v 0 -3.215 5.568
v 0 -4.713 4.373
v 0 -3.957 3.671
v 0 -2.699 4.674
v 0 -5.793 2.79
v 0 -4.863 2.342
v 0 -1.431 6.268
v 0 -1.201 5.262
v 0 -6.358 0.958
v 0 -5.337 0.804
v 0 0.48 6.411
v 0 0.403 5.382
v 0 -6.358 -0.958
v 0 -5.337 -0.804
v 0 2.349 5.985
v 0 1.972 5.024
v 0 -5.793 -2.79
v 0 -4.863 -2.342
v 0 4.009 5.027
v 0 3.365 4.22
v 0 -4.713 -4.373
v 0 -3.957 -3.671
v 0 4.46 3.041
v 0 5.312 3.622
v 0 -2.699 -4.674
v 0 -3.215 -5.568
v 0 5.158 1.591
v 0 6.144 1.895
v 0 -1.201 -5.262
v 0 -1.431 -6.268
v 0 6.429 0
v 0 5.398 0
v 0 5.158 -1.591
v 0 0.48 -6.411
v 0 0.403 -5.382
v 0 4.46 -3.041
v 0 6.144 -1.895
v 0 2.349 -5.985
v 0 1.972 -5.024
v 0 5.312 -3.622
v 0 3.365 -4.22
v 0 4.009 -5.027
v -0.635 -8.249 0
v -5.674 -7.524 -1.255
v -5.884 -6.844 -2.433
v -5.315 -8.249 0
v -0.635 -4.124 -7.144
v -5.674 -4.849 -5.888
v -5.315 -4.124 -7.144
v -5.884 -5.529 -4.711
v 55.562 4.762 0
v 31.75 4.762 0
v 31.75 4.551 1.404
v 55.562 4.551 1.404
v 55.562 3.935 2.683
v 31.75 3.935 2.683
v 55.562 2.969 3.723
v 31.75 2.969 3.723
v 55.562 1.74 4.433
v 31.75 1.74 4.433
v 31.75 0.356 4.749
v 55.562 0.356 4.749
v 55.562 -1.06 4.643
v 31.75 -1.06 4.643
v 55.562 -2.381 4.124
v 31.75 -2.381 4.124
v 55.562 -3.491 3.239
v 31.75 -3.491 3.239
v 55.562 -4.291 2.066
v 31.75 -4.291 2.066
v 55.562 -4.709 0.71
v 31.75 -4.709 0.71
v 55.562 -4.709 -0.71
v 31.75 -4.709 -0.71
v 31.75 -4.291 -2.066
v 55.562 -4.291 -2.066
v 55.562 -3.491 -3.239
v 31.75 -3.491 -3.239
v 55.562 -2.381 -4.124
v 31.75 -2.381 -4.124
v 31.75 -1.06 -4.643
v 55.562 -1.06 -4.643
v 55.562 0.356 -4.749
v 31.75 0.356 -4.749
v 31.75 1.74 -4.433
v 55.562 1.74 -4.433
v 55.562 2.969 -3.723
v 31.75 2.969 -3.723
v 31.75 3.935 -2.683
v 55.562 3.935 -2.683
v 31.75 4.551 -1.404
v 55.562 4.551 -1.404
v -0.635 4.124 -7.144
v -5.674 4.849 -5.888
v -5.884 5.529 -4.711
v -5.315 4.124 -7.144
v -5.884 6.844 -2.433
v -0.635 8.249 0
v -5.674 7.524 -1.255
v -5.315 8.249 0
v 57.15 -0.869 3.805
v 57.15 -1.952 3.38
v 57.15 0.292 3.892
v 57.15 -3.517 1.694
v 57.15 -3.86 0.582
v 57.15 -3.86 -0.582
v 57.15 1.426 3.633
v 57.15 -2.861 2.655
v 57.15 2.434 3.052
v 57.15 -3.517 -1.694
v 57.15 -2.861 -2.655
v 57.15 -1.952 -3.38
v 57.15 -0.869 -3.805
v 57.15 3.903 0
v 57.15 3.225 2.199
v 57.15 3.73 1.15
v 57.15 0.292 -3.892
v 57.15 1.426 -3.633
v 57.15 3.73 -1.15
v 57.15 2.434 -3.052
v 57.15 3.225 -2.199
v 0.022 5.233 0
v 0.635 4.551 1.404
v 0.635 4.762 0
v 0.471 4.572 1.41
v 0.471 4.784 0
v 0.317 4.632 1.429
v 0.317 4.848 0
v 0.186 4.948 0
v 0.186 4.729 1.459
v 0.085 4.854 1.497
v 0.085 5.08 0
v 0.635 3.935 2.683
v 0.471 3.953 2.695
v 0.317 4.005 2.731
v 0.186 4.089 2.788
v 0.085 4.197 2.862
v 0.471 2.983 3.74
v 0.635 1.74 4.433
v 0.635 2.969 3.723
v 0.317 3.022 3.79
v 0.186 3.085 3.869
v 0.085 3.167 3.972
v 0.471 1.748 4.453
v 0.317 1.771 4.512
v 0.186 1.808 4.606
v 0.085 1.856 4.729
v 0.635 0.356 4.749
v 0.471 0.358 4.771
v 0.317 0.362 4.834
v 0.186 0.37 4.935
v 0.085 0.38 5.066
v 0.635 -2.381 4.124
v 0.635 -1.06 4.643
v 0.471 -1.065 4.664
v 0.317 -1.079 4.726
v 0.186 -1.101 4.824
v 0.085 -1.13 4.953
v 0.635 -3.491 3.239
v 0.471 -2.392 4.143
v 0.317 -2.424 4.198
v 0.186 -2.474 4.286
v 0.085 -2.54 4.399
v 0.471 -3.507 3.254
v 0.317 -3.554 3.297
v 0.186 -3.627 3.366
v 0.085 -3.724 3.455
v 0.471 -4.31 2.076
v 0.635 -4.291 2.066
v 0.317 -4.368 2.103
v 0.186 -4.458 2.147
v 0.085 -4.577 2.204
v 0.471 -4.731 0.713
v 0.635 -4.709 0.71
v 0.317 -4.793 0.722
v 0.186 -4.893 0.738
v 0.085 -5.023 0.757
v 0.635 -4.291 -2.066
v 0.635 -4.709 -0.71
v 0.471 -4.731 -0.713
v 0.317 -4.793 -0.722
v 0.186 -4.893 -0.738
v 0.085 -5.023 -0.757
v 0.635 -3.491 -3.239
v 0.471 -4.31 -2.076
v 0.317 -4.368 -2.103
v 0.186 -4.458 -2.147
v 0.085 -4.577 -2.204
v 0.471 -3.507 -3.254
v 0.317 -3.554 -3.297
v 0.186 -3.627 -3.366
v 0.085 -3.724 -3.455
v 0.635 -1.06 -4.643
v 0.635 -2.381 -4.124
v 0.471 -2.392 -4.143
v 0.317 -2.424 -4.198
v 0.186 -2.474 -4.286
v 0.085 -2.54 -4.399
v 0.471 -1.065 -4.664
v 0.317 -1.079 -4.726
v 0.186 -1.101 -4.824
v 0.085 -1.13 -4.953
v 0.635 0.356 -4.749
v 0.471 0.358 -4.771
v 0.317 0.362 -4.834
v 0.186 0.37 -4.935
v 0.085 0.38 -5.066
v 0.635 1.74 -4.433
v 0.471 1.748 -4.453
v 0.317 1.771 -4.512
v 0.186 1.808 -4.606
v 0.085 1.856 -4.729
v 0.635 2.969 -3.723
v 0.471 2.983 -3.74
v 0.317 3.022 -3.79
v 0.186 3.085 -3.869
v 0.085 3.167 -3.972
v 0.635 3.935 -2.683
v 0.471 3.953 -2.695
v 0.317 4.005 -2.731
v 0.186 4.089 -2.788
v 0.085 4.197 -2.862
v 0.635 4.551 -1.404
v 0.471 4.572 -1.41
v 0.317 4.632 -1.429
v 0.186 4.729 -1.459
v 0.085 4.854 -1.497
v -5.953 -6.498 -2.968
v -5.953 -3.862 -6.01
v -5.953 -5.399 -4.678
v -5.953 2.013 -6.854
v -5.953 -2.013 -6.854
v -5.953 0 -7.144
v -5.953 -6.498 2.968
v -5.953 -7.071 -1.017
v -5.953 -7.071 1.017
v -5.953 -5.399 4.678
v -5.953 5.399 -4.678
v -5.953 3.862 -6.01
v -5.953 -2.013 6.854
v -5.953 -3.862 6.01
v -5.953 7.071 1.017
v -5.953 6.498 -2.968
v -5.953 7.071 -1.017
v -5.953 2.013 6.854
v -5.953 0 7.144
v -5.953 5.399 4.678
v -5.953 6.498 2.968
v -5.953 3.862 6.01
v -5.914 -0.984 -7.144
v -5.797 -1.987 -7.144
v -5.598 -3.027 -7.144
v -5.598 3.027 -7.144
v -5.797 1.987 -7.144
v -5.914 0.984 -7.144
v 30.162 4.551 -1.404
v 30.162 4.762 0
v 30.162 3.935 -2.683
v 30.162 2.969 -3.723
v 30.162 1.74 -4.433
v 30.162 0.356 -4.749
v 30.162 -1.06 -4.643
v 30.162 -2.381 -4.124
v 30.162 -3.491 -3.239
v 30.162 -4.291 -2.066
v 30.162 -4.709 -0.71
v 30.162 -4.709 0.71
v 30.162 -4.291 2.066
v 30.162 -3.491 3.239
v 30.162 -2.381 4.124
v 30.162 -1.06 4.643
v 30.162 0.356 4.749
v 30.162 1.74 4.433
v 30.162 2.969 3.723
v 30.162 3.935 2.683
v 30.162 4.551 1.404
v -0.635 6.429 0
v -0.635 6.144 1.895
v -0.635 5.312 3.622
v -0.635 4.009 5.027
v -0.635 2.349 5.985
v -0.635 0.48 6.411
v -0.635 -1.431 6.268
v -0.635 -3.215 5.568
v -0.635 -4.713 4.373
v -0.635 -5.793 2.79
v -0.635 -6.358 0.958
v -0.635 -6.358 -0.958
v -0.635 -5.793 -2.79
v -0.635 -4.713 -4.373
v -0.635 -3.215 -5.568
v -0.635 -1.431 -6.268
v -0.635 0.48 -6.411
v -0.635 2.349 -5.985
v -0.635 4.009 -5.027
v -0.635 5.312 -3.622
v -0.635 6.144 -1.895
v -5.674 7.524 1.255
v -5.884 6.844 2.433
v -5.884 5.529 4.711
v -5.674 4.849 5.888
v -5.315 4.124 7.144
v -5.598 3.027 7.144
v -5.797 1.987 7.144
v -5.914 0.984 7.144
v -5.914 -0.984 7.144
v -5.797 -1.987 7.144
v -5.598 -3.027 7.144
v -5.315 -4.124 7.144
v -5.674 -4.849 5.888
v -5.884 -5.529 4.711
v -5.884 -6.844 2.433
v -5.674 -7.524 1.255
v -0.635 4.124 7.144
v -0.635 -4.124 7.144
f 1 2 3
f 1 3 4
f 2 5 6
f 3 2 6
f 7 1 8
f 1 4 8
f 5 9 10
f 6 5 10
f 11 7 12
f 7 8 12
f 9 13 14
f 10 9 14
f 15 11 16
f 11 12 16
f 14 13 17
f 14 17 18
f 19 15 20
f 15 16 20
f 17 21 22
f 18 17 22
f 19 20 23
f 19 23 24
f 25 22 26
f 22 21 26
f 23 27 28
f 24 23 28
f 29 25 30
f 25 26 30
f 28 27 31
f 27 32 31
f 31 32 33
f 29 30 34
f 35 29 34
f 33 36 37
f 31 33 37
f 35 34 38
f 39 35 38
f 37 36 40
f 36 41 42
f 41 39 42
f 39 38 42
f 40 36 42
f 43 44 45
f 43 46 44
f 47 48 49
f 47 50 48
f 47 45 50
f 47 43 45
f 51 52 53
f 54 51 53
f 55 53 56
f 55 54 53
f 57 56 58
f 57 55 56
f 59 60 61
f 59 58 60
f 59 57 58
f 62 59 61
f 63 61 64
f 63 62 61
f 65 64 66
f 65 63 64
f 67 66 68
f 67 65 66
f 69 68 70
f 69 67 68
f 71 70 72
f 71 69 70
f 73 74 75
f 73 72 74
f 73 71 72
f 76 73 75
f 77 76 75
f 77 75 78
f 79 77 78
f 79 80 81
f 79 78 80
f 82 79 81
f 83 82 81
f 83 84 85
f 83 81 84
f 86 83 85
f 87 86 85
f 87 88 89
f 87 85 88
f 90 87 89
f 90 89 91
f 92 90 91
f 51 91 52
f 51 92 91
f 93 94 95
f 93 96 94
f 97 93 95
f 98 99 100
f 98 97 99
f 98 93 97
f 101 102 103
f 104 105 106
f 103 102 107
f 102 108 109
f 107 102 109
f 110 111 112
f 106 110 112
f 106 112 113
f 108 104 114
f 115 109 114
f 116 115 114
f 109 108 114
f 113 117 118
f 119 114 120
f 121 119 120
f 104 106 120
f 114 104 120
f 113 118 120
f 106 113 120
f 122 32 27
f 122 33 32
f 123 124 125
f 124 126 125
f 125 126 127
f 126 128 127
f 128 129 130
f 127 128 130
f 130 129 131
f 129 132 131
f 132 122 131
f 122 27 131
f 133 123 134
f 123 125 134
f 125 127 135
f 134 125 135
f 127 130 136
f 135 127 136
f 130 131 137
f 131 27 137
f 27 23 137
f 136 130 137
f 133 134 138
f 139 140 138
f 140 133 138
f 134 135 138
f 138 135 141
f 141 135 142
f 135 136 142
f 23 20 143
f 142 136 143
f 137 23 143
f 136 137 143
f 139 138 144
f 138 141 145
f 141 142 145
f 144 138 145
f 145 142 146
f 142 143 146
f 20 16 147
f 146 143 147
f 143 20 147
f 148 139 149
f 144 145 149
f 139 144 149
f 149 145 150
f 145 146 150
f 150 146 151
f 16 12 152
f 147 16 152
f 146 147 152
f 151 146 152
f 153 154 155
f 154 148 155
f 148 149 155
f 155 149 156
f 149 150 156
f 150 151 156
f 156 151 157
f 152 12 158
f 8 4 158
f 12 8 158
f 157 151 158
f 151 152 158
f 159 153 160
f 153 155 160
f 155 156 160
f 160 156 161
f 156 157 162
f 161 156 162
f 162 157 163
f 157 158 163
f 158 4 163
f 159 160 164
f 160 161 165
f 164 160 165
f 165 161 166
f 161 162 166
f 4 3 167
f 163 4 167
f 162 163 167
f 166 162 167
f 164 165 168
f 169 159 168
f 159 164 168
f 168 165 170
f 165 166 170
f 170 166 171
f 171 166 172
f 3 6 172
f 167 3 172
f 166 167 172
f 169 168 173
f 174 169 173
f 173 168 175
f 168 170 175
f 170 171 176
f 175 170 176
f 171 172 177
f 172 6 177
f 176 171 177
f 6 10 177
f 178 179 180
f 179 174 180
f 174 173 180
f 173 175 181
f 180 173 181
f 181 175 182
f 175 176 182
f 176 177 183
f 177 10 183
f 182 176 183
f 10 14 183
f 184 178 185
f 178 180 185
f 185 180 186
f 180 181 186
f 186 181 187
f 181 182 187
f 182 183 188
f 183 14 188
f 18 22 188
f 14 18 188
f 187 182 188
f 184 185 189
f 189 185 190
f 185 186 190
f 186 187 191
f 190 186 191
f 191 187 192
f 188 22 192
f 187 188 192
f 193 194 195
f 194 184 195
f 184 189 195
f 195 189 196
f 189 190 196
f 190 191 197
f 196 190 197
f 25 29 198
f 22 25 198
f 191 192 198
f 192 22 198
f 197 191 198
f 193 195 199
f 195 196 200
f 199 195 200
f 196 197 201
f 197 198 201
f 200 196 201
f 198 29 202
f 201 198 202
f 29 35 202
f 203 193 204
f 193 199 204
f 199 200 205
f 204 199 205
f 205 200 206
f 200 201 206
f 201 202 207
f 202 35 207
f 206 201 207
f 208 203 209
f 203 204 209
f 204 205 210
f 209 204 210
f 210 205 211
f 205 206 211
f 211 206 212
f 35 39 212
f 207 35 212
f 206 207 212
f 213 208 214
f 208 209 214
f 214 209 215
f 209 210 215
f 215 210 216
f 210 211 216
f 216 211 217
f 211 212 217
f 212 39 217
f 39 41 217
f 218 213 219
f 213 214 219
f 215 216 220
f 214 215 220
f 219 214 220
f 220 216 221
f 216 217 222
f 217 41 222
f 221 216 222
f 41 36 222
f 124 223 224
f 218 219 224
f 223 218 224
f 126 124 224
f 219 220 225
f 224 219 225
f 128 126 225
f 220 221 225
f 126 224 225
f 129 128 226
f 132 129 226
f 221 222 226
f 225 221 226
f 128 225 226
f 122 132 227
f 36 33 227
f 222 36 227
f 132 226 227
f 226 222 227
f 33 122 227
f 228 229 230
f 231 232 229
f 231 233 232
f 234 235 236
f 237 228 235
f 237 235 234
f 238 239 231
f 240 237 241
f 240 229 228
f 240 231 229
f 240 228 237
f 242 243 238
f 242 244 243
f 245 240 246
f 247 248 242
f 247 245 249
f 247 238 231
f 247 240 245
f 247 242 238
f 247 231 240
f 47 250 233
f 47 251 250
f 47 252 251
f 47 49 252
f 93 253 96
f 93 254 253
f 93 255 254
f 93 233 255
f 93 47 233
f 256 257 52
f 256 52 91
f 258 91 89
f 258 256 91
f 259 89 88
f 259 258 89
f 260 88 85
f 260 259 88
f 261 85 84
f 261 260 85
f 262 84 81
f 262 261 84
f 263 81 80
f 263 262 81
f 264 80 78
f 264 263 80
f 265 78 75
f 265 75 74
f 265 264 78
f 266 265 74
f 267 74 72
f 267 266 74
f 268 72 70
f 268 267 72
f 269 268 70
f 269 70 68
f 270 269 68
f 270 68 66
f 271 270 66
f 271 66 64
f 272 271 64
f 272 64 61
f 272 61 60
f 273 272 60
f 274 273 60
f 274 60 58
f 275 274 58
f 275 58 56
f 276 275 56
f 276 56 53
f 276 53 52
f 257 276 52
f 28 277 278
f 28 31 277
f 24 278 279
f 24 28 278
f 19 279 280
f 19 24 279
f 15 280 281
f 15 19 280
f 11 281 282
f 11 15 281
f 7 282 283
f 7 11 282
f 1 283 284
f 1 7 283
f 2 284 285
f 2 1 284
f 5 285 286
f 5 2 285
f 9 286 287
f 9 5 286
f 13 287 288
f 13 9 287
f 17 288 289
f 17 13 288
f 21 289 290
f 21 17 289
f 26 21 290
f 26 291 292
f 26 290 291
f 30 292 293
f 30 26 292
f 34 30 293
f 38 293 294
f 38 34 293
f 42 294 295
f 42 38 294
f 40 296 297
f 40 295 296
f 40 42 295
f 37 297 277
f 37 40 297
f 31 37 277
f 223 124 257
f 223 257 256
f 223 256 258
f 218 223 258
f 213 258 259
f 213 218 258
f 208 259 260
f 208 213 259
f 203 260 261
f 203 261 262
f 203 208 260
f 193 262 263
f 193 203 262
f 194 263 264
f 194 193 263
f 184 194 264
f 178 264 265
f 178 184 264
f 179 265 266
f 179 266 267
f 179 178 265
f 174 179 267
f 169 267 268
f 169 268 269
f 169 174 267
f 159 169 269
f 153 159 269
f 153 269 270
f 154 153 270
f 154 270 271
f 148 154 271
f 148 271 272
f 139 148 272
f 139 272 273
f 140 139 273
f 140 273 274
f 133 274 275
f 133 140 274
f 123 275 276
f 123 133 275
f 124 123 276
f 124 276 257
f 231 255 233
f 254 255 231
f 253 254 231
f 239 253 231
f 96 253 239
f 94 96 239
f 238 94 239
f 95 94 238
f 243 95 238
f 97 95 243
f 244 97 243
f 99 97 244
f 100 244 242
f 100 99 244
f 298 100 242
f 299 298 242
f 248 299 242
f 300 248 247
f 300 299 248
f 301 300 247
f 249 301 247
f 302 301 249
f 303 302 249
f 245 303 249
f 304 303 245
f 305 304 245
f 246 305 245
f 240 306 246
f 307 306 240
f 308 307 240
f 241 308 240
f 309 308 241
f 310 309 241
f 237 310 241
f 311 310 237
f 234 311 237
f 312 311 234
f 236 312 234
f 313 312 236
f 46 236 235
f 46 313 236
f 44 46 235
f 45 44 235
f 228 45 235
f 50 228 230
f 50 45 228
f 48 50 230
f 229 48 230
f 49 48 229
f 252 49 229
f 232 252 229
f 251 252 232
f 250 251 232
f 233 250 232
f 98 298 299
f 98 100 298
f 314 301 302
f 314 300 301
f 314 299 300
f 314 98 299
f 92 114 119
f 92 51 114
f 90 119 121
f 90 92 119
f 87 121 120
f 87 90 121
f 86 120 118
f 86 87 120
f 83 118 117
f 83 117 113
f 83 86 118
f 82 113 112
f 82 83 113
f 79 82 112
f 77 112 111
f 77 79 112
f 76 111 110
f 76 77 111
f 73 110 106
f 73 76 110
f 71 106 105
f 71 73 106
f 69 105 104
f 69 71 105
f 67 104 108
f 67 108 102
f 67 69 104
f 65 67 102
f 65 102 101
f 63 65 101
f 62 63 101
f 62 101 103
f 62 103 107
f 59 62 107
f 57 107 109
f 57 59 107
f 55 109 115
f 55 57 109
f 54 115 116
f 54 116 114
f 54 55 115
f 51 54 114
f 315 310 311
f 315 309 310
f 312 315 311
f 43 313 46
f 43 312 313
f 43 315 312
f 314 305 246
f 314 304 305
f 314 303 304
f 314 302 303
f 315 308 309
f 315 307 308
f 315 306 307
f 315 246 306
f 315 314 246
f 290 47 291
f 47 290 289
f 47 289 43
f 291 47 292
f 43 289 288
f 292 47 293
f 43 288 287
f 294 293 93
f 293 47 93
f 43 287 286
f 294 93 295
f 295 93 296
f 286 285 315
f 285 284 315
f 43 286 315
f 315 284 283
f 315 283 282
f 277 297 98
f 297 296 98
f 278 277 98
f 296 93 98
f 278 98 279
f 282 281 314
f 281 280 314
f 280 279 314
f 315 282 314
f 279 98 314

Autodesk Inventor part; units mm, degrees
ref_plane "YZ Plane" through (0, 0, 0) normal (1, 0, 0) x (0, 1, 0)
ref_plane "XZ Plane" through (0, 0, 0) normal (0, 1, 0) x (-1, 0, 0)
sketch "Sketch1" plane through (0, 0, 0) normal (0, 0, 1) x (1, 0, 0)
  line L0 (0, 6.4294) -> (0, 4.7625)
  line L1 (31.75, 4.7625) -> (57.15, 4.7625)
  line L2 (57.15, 4.7625) -> (57.15, 0)
  line L3 (57.15, 0) -> (-0.6351, 0)
  line L4 (-12.1921, 0) -> (68.707, 0) projected
  line L5 (-0.6351, 0) -> (-0.6351, 6.4294)
  line L6 (-0.6351, 6.4294) -> (0, 6.4294)
  line L7 (31.75, 4.7625) -> (30.1624, 4.7625)
  line L8 (30.1624, 4.7625) -> (0, 4.7625)
  line L9 (0, -1.2859) -> (0, 7.7152) projected
  dimension "d0" = 57.15
  dimension "d1" = 25.4
  dimension "d2" = 9.525
  dimension "d9" = 0.6351
  dimension "d10" = 12.8588
  dimension "d13" = 1.5876
  dimension "d14" = 9.525
revolve "Body" add sketch "Sketch1" angle 360 about axis through (57.15, 0, 0) along (-1, 0, 0)
sketch "Sketch2" plane through (-0.6351, 0, 0) normal (-1, 0, 0) x (0, 0, 1)
  line L0 (0, 8.2489) -> (7.1437, 4.1244)
  line L1 (7.1437, 4.1244) -> (7.1437, -4.1244)
  line L2 (7.1437, -4.1244) -> (0, -8.2489)
  line L3 (0, -8.2489) -> (-7.1437, -4.1244)
  line L4 (-7.1437, -4.1244) -> (-7.1437, 4.1244)
  line L5 (-7.1437, 4.1244) -> (0, 8.2489)
  point P0 (0, 0)
  point P1 (0, 0)
  dimension "d11" = 14.2875
extrude "Head" add sketch "Sketch2" along normal blind 5.3181
sketch "Sketch4" plane through (0, 0, 0) normal (0, 0, 1) x (1, 0, 0)
  line L0 (-5.9532, 7.1437) -> (-5.9532, 8.2489)
  line L1 (-5.9532, 8.2489) -> (-5.3152, 8.2489)
  line L2 (-5.3152, 8.2489) -> (-5.9532, 7.1437)
  line L3 (-7.0169, 0) -> (0.4285, 0) projected
  line L4 (-0.6351, 8.2489) -> (-5.9532, 8.2489) projected
  line L5 (-5.9532, 4.1244) -> (-5.9532, 8.2489) projected
  dimension "d5" = 30
  dimension "d19" = 14.2875
revolve "Chamfer1" cut sketch "Sketch4" angle 360 about axis through (-10, 0, 0) along (1, 0, 0)
thread "Thread" size "3/8-16 UNC" class "2A" standard "ANSI Unified Screw Threads" length 25.4
chamfer "Chamfer2" distance 0.8593 distance2 1.5876 1 edges at (57.15, -4.7625, 0) measured on face at (57.15, 0.9018, -1.6622)
ref_plane "Work Plane1" through (1.525, 0, 0) normal (0, 0, 1) x (1, 0, 0)
fillet "Fillet2" radius 0.635 1 edges at (0, -4.7625, 0)
equation "\"d0\" = NLG"
equation "\"d1\" = GEL"
equation "\"d2\" = GD"
equation "\"d10\" = SD2"
equation "\"d14\" = BDM"
equation "\"d11\" = SW"
equation "\"d3\" = KOH - SD"
equation "\"d5\" = ANG1"
equation "\"d19\" = SW0"
equation "\"d63\" = R"
equation "\"d15\" = GEL"
equation "\"d6\" = -0.5 * SPD + 0.5 * GD"
equation "\"NLG\" = 57.15"
equation "\"GD\" = NND"
equation "\"BDM\" = 9.525"
equation "\"KOH\" = 5.95312"
equation "\"GEL\" = 25.4"
equation "\"SW\" = 14.2875"
equation "\"SW0\" = SW"
equation "\"SPD\" = 7.80644"
equation "\"SD2\" = 12.85875"
equation "\"SD\" = 0.635"
equation "\"ANG1\" = 30deg"
equation "\"GAL\" = 1.5875"
equation "\"GUL\" = 1.5875"
equation "\"R\" = 0.635"
equation "\"THREADDIA\" = 9.525"
equation "\"TOA\" = 30deg"
equation "\"RR\" = 0.508"
equation "\"NND\" = 9.525"
equation "\"E0\" = 1.155 * SW"
equation "\"SLG\" = 0"
equation "\"GD1\" = 7.80644"
properties part number "ANSI B18.2.1 - 3/8-16 UNC - 2.25, HCSI" material "Steel, Mild"
